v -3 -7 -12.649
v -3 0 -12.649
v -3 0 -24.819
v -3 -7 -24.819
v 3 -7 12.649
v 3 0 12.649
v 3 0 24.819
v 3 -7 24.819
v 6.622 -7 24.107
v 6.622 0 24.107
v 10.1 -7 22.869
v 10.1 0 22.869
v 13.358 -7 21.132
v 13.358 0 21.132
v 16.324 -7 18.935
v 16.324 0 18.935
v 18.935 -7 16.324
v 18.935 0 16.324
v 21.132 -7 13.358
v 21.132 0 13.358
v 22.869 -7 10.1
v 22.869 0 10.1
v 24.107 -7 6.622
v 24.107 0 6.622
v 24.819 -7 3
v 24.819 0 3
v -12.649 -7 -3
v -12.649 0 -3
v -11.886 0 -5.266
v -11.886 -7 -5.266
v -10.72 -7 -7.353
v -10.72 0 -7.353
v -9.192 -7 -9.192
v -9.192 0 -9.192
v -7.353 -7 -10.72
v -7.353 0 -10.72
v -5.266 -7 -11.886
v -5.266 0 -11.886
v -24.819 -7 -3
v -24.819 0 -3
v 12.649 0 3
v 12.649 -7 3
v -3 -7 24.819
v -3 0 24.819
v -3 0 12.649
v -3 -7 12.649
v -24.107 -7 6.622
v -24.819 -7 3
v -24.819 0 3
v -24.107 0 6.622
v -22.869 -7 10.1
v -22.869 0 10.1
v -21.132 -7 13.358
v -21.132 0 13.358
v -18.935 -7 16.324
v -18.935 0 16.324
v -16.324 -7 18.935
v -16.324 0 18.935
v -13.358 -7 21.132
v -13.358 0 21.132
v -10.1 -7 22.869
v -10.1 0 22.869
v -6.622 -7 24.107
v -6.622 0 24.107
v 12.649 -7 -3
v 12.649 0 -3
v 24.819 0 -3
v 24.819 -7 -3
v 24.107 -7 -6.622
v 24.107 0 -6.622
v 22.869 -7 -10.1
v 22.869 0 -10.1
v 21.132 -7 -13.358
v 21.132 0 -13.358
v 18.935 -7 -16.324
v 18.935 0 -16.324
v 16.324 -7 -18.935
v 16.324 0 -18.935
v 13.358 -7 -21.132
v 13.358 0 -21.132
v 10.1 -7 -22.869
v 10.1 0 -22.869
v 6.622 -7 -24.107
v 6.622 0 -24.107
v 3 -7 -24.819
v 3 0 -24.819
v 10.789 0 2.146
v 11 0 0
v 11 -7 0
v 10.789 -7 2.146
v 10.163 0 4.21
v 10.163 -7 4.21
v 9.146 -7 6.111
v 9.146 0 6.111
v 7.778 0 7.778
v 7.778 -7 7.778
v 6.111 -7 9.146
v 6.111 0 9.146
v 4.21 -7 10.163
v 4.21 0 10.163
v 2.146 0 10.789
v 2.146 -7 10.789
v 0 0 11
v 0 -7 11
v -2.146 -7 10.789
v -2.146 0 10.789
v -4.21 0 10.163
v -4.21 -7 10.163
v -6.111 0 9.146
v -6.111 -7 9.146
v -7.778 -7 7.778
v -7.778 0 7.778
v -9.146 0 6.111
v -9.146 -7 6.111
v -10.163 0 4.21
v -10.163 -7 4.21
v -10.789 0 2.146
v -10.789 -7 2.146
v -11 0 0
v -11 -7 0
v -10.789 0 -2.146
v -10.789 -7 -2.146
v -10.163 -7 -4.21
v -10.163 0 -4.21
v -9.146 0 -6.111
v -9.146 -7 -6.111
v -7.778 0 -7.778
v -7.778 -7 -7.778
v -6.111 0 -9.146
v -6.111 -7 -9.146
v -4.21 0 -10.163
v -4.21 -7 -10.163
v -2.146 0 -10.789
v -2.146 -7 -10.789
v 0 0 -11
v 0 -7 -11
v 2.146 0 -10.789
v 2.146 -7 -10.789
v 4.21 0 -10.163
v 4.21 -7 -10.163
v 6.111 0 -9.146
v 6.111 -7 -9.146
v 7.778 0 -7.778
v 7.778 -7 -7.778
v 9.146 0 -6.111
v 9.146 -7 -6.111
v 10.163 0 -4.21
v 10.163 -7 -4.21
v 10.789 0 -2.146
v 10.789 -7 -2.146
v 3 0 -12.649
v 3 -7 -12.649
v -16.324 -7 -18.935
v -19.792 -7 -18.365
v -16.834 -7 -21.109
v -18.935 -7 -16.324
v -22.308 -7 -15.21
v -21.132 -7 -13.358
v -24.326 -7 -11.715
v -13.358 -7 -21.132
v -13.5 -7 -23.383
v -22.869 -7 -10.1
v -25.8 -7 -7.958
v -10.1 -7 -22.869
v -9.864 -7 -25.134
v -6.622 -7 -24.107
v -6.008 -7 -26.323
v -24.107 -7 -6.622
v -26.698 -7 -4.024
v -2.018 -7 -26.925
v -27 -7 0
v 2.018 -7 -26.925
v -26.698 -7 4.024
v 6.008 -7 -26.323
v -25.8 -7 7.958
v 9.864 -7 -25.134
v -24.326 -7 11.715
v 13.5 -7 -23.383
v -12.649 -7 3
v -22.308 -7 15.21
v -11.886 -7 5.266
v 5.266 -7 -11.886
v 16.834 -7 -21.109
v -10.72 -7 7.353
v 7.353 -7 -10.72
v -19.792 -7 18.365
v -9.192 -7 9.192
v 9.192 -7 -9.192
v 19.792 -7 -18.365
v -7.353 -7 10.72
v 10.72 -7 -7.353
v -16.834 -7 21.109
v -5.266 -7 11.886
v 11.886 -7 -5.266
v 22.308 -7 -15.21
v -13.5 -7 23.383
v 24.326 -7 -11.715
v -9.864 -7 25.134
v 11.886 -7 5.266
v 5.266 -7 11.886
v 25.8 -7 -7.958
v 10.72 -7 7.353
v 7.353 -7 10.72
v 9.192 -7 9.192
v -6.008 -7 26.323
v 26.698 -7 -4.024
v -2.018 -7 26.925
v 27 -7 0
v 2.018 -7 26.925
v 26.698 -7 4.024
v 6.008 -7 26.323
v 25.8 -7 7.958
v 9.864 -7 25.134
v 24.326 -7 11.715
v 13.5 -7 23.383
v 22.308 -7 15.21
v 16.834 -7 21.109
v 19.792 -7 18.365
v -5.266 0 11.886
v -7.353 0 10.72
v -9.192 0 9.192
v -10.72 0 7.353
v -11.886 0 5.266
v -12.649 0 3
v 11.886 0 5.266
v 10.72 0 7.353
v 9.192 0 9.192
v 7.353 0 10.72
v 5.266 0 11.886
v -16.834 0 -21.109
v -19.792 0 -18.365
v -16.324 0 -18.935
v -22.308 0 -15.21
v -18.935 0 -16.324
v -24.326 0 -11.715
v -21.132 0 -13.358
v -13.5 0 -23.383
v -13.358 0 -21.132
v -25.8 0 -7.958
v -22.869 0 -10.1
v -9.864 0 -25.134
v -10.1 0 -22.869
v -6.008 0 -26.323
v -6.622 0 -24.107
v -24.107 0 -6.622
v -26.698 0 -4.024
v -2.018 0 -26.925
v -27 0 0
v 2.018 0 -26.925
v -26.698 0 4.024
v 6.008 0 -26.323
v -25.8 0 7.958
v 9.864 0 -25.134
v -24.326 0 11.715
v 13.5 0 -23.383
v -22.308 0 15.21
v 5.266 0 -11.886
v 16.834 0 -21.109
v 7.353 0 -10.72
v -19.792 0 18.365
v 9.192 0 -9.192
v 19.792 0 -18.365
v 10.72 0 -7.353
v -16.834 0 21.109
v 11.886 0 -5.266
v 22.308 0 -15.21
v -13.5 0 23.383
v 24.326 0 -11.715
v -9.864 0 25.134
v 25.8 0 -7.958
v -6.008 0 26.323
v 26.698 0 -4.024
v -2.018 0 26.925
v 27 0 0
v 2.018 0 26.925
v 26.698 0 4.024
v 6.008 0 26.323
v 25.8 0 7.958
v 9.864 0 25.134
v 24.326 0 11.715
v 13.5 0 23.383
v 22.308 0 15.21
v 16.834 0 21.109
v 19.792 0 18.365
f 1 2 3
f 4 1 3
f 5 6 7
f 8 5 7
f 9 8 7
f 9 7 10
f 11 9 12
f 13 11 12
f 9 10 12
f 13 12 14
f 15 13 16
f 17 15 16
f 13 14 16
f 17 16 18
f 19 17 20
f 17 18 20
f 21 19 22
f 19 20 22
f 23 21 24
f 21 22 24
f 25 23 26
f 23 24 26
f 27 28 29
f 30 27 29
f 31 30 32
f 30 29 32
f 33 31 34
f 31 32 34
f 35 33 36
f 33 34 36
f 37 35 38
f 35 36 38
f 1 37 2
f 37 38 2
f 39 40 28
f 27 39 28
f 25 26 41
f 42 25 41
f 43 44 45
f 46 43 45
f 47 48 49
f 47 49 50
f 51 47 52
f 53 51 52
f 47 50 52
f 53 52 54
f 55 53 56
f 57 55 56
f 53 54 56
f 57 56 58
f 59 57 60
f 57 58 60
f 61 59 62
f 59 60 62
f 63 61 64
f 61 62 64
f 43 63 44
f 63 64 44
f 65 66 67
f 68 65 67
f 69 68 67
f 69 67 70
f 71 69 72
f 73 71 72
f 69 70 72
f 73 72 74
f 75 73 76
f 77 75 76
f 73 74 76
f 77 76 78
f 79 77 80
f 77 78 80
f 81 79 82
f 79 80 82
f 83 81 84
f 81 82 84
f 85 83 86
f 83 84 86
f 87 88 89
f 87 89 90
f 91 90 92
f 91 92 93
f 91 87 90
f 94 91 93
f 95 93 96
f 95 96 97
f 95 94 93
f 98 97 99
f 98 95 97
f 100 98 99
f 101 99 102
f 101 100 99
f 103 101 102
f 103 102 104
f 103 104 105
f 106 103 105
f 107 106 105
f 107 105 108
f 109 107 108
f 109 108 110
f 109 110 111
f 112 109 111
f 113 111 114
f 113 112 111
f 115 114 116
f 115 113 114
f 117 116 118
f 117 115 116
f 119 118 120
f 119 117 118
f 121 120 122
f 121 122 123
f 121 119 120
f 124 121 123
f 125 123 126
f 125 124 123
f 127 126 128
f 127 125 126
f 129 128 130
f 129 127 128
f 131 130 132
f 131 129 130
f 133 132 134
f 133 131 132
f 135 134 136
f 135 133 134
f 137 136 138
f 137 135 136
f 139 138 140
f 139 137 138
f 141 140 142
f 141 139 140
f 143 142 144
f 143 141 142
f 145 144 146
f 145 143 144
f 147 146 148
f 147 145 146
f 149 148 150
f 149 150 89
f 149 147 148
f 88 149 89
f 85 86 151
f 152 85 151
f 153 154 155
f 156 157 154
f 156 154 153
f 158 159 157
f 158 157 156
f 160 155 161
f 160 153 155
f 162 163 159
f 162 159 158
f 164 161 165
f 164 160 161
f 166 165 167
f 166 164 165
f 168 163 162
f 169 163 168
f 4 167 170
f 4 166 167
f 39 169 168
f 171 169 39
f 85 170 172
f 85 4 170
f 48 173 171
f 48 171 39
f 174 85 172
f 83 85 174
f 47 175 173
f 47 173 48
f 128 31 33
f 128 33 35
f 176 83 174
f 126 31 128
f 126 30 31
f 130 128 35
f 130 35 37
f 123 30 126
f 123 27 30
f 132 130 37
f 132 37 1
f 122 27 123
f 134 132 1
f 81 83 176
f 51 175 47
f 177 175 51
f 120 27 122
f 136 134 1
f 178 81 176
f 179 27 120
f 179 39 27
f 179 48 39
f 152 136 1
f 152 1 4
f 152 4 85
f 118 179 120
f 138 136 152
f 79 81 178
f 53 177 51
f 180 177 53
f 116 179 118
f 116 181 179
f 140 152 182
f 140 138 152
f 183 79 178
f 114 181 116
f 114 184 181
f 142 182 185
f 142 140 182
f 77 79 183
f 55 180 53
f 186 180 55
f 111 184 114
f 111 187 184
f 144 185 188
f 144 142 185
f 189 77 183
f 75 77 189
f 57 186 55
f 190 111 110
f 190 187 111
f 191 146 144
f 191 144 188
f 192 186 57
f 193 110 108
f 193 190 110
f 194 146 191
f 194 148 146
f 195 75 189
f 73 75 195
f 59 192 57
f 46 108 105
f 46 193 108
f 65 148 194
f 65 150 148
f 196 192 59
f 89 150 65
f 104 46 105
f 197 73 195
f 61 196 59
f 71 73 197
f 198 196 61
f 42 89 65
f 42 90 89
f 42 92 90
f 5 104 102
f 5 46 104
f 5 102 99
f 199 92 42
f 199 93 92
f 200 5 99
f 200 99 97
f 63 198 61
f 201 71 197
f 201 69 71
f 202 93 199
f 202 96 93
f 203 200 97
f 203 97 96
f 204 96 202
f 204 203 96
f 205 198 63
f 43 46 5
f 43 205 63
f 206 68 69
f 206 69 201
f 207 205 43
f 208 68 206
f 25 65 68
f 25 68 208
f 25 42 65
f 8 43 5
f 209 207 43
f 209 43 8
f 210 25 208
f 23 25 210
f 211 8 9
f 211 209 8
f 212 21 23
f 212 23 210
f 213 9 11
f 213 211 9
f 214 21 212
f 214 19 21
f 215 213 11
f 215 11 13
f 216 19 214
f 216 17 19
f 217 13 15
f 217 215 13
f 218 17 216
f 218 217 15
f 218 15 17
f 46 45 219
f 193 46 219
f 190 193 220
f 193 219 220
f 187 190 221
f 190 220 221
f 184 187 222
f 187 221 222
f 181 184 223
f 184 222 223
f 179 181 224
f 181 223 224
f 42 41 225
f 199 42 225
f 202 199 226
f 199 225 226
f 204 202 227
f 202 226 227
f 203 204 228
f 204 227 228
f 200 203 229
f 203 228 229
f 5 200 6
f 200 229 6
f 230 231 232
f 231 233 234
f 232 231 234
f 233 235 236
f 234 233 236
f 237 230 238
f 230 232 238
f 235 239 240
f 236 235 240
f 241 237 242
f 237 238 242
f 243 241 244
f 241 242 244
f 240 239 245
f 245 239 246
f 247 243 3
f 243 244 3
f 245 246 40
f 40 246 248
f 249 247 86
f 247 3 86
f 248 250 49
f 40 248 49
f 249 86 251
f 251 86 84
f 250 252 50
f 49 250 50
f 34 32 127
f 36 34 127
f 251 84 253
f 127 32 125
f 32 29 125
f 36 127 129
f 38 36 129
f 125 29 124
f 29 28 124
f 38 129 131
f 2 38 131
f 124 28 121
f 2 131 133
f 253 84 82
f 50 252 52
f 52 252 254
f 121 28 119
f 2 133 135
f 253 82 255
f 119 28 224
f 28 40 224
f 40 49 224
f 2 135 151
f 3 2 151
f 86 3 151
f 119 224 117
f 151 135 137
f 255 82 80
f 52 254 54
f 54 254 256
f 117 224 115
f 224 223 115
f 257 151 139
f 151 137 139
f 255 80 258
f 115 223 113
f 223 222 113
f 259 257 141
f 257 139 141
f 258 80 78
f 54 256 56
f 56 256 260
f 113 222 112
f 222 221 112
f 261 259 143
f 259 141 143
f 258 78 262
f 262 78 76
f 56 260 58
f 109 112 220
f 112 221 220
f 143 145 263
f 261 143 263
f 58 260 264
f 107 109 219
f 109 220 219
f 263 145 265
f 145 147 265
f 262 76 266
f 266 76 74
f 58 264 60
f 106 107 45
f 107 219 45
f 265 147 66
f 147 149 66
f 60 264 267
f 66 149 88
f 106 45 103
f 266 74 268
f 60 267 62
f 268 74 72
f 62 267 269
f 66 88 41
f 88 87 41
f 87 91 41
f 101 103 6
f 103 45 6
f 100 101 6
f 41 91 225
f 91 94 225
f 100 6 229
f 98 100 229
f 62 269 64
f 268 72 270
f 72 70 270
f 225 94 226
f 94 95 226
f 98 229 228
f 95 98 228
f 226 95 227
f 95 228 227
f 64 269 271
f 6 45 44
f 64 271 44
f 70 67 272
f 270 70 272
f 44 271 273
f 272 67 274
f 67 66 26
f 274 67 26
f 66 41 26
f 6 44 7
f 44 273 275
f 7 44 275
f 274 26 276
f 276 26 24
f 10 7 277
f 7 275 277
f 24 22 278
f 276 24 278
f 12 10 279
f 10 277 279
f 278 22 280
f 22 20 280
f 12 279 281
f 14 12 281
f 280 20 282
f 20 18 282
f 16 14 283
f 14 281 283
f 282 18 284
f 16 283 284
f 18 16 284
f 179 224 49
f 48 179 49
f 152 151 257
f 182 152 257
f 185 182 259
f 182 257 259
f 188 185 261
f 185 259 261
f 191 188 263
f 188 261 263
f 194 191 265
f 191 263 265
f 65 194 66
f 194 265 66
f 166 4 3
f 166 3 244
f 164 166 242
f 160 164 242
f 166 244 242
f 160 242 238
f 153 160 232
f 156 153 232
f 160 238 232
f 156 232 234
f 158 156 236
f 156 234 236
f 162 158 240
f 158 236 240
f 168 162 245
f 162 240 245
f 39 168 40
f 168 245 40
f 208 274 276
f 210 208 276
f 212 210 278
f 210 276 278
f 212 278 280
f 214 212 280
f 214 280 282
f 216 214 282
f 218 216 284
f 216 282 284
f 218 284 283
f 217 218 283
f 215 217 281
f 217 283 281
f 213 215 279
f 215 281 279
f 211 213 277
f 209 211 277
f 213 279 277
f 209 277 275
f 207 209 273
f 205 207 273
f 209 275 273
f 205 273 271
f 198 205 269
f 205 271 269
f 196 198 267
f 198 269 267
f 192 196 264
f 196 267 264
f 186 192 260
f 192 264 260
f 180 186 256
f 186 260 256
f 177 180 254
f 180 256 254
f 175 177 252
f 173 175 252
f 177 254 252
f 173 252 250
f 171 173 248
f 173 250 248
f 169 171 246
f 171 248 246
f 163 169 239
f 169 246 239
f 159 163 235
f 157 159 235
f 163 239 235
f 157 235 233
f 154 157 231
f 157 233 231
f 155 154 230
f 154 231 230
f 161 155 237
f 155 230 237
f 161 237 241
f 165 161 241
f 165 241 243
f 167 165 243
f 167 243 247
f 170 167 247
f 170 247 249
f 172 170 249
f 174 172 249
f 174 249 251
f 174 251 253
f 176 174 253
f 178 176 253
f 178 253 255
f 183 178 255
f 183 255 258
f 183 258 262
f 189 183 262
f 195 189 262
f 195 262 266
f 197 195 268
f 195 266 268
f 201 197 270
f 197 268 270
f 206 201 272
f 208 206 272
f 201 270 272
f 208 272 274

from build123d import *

# Parameters (mm, degrees)
F0_R     = 27
F0_R_2   = 11
F1_DEPTH = 7


with BuildPart() as f1:
    # F0 (on Front) → F1 (new body)
    with BuildSketch(Plane.XZ):
        Circle(F0_R)
        with BuildLine():
            ThreePointArc((3, 24.819347), (17.67767, 17.67767), (24.819347, 3))
            ThreePointArc((24.819347, 3), (24.954796, 1.502717), (25, 0))
            ThreePointArc((25, 0), (24.954796, -1.502717), (24.819347, -3))
            ThreePointArc((24.819347, -3), (17.67767, -17.67767), (3, -24.819347))
            ThreePointArc((3, -24.819347), (0, -25), (-3, -24.819347))
            ThreePointArc((-3, -24.819347), (-17.67767, -17.67767), (-24.819347, -3))
            ThreePointArc((-24.819347, -3), (-25, 0), (-24.819347, 3))
            ThreePointArc((-24.819347, 3), (-17.67767, 17.67767), (-3, 24.819347))
            ThreePointArc((-3, 24.819347), (0, 25), (3, 24.819347))
        make_face(mode=Mode.SUBTRACT)
        with BuildLine():
            ThreePointArc((-12.649111, -3), (-13, 0), (-12.649111, 3))
            Line((-12.649111, 3), (-24.819347, 3))
            ThreePointArc((-24.819347, 3), (-25, 0), (-24.819347, -3))
            Line((-24.819347, -3), (-12.649111, -3))
        make_face()
        with BuildLine():
            ThreePointArc((-3, 12.649111), (0, 13), (3, 12.649111))
            Line((3, 12.649111), (3, 24.819347))
            ThreePointArc((3, 24.819347), (0, 25), (-3, 24.819347))
            Line((-3, 24.819347), (-3, 12.649111))
        make_face()
        with BuildLine():
            ThreePointArc((12.649111, 3), (12.91198, 1.510225), (13, 0))
            ThreePointArc((13, 0), (12.91198, -1.510225), (12.649111, -3))
            Line((12.649111, -3), (24.819347, -3))
            ThreePointArc((24.819347, -3), (24.954796, -1.502717), (25, 0))
            ThreePointArc((25, 0), (24.954796, 1.502717), (24.819347, 3))
            Line((24.819347, 3), (12.649111, 3))
        make_face()
        with BuildLine():
            ThreePointArc((12.649111, -3), (12.91198, -1.510225), (13, 0))
            ThreePointArc((13, 0), (12.91198, 1.510225), (12.649111, 3))
            ThreePointArc((12.649111, 3), (9.192388, 9.192388), (3, 12.649111))
            ThreePointArc((3, 12.649111), (0, 13), (-3, 12.649111))
            ThreePointArc((-3, 12.649111), (-9.192388, 9.192388), (-12.649111, 3))
            ThreePointArc((-12.649111, 3), (-13, 0), (-12.649111, -3))
            ThreePointArc((-12.649111, -3), (-9.192388, -9.192388), (-3, -12.649111))
            ThreePointArc((-3, -12.649111), (0, -13), (3, -12.649111))
            ThreePointArc((3, -12.649111), (9.192388, -9.192388), (12.649111, -3))
        make_face()
        Circle(F0_R_2, mode=Mode.SUBTRACT)
        with BuildLine():
            Line((3, -24.819347), (3, -12.649111))
            ThreePointArc((3, -12.649111), (0, -13), (-3, -12.649111))
            Line((-3, -12.649111), (-3, -24.819347))
            ThreePointArc((-3, -24.819347), (0, -25), (3, -24.819347))
        make_face()
    extrude(amount=F1_DEPTH)


solid = f1.part
